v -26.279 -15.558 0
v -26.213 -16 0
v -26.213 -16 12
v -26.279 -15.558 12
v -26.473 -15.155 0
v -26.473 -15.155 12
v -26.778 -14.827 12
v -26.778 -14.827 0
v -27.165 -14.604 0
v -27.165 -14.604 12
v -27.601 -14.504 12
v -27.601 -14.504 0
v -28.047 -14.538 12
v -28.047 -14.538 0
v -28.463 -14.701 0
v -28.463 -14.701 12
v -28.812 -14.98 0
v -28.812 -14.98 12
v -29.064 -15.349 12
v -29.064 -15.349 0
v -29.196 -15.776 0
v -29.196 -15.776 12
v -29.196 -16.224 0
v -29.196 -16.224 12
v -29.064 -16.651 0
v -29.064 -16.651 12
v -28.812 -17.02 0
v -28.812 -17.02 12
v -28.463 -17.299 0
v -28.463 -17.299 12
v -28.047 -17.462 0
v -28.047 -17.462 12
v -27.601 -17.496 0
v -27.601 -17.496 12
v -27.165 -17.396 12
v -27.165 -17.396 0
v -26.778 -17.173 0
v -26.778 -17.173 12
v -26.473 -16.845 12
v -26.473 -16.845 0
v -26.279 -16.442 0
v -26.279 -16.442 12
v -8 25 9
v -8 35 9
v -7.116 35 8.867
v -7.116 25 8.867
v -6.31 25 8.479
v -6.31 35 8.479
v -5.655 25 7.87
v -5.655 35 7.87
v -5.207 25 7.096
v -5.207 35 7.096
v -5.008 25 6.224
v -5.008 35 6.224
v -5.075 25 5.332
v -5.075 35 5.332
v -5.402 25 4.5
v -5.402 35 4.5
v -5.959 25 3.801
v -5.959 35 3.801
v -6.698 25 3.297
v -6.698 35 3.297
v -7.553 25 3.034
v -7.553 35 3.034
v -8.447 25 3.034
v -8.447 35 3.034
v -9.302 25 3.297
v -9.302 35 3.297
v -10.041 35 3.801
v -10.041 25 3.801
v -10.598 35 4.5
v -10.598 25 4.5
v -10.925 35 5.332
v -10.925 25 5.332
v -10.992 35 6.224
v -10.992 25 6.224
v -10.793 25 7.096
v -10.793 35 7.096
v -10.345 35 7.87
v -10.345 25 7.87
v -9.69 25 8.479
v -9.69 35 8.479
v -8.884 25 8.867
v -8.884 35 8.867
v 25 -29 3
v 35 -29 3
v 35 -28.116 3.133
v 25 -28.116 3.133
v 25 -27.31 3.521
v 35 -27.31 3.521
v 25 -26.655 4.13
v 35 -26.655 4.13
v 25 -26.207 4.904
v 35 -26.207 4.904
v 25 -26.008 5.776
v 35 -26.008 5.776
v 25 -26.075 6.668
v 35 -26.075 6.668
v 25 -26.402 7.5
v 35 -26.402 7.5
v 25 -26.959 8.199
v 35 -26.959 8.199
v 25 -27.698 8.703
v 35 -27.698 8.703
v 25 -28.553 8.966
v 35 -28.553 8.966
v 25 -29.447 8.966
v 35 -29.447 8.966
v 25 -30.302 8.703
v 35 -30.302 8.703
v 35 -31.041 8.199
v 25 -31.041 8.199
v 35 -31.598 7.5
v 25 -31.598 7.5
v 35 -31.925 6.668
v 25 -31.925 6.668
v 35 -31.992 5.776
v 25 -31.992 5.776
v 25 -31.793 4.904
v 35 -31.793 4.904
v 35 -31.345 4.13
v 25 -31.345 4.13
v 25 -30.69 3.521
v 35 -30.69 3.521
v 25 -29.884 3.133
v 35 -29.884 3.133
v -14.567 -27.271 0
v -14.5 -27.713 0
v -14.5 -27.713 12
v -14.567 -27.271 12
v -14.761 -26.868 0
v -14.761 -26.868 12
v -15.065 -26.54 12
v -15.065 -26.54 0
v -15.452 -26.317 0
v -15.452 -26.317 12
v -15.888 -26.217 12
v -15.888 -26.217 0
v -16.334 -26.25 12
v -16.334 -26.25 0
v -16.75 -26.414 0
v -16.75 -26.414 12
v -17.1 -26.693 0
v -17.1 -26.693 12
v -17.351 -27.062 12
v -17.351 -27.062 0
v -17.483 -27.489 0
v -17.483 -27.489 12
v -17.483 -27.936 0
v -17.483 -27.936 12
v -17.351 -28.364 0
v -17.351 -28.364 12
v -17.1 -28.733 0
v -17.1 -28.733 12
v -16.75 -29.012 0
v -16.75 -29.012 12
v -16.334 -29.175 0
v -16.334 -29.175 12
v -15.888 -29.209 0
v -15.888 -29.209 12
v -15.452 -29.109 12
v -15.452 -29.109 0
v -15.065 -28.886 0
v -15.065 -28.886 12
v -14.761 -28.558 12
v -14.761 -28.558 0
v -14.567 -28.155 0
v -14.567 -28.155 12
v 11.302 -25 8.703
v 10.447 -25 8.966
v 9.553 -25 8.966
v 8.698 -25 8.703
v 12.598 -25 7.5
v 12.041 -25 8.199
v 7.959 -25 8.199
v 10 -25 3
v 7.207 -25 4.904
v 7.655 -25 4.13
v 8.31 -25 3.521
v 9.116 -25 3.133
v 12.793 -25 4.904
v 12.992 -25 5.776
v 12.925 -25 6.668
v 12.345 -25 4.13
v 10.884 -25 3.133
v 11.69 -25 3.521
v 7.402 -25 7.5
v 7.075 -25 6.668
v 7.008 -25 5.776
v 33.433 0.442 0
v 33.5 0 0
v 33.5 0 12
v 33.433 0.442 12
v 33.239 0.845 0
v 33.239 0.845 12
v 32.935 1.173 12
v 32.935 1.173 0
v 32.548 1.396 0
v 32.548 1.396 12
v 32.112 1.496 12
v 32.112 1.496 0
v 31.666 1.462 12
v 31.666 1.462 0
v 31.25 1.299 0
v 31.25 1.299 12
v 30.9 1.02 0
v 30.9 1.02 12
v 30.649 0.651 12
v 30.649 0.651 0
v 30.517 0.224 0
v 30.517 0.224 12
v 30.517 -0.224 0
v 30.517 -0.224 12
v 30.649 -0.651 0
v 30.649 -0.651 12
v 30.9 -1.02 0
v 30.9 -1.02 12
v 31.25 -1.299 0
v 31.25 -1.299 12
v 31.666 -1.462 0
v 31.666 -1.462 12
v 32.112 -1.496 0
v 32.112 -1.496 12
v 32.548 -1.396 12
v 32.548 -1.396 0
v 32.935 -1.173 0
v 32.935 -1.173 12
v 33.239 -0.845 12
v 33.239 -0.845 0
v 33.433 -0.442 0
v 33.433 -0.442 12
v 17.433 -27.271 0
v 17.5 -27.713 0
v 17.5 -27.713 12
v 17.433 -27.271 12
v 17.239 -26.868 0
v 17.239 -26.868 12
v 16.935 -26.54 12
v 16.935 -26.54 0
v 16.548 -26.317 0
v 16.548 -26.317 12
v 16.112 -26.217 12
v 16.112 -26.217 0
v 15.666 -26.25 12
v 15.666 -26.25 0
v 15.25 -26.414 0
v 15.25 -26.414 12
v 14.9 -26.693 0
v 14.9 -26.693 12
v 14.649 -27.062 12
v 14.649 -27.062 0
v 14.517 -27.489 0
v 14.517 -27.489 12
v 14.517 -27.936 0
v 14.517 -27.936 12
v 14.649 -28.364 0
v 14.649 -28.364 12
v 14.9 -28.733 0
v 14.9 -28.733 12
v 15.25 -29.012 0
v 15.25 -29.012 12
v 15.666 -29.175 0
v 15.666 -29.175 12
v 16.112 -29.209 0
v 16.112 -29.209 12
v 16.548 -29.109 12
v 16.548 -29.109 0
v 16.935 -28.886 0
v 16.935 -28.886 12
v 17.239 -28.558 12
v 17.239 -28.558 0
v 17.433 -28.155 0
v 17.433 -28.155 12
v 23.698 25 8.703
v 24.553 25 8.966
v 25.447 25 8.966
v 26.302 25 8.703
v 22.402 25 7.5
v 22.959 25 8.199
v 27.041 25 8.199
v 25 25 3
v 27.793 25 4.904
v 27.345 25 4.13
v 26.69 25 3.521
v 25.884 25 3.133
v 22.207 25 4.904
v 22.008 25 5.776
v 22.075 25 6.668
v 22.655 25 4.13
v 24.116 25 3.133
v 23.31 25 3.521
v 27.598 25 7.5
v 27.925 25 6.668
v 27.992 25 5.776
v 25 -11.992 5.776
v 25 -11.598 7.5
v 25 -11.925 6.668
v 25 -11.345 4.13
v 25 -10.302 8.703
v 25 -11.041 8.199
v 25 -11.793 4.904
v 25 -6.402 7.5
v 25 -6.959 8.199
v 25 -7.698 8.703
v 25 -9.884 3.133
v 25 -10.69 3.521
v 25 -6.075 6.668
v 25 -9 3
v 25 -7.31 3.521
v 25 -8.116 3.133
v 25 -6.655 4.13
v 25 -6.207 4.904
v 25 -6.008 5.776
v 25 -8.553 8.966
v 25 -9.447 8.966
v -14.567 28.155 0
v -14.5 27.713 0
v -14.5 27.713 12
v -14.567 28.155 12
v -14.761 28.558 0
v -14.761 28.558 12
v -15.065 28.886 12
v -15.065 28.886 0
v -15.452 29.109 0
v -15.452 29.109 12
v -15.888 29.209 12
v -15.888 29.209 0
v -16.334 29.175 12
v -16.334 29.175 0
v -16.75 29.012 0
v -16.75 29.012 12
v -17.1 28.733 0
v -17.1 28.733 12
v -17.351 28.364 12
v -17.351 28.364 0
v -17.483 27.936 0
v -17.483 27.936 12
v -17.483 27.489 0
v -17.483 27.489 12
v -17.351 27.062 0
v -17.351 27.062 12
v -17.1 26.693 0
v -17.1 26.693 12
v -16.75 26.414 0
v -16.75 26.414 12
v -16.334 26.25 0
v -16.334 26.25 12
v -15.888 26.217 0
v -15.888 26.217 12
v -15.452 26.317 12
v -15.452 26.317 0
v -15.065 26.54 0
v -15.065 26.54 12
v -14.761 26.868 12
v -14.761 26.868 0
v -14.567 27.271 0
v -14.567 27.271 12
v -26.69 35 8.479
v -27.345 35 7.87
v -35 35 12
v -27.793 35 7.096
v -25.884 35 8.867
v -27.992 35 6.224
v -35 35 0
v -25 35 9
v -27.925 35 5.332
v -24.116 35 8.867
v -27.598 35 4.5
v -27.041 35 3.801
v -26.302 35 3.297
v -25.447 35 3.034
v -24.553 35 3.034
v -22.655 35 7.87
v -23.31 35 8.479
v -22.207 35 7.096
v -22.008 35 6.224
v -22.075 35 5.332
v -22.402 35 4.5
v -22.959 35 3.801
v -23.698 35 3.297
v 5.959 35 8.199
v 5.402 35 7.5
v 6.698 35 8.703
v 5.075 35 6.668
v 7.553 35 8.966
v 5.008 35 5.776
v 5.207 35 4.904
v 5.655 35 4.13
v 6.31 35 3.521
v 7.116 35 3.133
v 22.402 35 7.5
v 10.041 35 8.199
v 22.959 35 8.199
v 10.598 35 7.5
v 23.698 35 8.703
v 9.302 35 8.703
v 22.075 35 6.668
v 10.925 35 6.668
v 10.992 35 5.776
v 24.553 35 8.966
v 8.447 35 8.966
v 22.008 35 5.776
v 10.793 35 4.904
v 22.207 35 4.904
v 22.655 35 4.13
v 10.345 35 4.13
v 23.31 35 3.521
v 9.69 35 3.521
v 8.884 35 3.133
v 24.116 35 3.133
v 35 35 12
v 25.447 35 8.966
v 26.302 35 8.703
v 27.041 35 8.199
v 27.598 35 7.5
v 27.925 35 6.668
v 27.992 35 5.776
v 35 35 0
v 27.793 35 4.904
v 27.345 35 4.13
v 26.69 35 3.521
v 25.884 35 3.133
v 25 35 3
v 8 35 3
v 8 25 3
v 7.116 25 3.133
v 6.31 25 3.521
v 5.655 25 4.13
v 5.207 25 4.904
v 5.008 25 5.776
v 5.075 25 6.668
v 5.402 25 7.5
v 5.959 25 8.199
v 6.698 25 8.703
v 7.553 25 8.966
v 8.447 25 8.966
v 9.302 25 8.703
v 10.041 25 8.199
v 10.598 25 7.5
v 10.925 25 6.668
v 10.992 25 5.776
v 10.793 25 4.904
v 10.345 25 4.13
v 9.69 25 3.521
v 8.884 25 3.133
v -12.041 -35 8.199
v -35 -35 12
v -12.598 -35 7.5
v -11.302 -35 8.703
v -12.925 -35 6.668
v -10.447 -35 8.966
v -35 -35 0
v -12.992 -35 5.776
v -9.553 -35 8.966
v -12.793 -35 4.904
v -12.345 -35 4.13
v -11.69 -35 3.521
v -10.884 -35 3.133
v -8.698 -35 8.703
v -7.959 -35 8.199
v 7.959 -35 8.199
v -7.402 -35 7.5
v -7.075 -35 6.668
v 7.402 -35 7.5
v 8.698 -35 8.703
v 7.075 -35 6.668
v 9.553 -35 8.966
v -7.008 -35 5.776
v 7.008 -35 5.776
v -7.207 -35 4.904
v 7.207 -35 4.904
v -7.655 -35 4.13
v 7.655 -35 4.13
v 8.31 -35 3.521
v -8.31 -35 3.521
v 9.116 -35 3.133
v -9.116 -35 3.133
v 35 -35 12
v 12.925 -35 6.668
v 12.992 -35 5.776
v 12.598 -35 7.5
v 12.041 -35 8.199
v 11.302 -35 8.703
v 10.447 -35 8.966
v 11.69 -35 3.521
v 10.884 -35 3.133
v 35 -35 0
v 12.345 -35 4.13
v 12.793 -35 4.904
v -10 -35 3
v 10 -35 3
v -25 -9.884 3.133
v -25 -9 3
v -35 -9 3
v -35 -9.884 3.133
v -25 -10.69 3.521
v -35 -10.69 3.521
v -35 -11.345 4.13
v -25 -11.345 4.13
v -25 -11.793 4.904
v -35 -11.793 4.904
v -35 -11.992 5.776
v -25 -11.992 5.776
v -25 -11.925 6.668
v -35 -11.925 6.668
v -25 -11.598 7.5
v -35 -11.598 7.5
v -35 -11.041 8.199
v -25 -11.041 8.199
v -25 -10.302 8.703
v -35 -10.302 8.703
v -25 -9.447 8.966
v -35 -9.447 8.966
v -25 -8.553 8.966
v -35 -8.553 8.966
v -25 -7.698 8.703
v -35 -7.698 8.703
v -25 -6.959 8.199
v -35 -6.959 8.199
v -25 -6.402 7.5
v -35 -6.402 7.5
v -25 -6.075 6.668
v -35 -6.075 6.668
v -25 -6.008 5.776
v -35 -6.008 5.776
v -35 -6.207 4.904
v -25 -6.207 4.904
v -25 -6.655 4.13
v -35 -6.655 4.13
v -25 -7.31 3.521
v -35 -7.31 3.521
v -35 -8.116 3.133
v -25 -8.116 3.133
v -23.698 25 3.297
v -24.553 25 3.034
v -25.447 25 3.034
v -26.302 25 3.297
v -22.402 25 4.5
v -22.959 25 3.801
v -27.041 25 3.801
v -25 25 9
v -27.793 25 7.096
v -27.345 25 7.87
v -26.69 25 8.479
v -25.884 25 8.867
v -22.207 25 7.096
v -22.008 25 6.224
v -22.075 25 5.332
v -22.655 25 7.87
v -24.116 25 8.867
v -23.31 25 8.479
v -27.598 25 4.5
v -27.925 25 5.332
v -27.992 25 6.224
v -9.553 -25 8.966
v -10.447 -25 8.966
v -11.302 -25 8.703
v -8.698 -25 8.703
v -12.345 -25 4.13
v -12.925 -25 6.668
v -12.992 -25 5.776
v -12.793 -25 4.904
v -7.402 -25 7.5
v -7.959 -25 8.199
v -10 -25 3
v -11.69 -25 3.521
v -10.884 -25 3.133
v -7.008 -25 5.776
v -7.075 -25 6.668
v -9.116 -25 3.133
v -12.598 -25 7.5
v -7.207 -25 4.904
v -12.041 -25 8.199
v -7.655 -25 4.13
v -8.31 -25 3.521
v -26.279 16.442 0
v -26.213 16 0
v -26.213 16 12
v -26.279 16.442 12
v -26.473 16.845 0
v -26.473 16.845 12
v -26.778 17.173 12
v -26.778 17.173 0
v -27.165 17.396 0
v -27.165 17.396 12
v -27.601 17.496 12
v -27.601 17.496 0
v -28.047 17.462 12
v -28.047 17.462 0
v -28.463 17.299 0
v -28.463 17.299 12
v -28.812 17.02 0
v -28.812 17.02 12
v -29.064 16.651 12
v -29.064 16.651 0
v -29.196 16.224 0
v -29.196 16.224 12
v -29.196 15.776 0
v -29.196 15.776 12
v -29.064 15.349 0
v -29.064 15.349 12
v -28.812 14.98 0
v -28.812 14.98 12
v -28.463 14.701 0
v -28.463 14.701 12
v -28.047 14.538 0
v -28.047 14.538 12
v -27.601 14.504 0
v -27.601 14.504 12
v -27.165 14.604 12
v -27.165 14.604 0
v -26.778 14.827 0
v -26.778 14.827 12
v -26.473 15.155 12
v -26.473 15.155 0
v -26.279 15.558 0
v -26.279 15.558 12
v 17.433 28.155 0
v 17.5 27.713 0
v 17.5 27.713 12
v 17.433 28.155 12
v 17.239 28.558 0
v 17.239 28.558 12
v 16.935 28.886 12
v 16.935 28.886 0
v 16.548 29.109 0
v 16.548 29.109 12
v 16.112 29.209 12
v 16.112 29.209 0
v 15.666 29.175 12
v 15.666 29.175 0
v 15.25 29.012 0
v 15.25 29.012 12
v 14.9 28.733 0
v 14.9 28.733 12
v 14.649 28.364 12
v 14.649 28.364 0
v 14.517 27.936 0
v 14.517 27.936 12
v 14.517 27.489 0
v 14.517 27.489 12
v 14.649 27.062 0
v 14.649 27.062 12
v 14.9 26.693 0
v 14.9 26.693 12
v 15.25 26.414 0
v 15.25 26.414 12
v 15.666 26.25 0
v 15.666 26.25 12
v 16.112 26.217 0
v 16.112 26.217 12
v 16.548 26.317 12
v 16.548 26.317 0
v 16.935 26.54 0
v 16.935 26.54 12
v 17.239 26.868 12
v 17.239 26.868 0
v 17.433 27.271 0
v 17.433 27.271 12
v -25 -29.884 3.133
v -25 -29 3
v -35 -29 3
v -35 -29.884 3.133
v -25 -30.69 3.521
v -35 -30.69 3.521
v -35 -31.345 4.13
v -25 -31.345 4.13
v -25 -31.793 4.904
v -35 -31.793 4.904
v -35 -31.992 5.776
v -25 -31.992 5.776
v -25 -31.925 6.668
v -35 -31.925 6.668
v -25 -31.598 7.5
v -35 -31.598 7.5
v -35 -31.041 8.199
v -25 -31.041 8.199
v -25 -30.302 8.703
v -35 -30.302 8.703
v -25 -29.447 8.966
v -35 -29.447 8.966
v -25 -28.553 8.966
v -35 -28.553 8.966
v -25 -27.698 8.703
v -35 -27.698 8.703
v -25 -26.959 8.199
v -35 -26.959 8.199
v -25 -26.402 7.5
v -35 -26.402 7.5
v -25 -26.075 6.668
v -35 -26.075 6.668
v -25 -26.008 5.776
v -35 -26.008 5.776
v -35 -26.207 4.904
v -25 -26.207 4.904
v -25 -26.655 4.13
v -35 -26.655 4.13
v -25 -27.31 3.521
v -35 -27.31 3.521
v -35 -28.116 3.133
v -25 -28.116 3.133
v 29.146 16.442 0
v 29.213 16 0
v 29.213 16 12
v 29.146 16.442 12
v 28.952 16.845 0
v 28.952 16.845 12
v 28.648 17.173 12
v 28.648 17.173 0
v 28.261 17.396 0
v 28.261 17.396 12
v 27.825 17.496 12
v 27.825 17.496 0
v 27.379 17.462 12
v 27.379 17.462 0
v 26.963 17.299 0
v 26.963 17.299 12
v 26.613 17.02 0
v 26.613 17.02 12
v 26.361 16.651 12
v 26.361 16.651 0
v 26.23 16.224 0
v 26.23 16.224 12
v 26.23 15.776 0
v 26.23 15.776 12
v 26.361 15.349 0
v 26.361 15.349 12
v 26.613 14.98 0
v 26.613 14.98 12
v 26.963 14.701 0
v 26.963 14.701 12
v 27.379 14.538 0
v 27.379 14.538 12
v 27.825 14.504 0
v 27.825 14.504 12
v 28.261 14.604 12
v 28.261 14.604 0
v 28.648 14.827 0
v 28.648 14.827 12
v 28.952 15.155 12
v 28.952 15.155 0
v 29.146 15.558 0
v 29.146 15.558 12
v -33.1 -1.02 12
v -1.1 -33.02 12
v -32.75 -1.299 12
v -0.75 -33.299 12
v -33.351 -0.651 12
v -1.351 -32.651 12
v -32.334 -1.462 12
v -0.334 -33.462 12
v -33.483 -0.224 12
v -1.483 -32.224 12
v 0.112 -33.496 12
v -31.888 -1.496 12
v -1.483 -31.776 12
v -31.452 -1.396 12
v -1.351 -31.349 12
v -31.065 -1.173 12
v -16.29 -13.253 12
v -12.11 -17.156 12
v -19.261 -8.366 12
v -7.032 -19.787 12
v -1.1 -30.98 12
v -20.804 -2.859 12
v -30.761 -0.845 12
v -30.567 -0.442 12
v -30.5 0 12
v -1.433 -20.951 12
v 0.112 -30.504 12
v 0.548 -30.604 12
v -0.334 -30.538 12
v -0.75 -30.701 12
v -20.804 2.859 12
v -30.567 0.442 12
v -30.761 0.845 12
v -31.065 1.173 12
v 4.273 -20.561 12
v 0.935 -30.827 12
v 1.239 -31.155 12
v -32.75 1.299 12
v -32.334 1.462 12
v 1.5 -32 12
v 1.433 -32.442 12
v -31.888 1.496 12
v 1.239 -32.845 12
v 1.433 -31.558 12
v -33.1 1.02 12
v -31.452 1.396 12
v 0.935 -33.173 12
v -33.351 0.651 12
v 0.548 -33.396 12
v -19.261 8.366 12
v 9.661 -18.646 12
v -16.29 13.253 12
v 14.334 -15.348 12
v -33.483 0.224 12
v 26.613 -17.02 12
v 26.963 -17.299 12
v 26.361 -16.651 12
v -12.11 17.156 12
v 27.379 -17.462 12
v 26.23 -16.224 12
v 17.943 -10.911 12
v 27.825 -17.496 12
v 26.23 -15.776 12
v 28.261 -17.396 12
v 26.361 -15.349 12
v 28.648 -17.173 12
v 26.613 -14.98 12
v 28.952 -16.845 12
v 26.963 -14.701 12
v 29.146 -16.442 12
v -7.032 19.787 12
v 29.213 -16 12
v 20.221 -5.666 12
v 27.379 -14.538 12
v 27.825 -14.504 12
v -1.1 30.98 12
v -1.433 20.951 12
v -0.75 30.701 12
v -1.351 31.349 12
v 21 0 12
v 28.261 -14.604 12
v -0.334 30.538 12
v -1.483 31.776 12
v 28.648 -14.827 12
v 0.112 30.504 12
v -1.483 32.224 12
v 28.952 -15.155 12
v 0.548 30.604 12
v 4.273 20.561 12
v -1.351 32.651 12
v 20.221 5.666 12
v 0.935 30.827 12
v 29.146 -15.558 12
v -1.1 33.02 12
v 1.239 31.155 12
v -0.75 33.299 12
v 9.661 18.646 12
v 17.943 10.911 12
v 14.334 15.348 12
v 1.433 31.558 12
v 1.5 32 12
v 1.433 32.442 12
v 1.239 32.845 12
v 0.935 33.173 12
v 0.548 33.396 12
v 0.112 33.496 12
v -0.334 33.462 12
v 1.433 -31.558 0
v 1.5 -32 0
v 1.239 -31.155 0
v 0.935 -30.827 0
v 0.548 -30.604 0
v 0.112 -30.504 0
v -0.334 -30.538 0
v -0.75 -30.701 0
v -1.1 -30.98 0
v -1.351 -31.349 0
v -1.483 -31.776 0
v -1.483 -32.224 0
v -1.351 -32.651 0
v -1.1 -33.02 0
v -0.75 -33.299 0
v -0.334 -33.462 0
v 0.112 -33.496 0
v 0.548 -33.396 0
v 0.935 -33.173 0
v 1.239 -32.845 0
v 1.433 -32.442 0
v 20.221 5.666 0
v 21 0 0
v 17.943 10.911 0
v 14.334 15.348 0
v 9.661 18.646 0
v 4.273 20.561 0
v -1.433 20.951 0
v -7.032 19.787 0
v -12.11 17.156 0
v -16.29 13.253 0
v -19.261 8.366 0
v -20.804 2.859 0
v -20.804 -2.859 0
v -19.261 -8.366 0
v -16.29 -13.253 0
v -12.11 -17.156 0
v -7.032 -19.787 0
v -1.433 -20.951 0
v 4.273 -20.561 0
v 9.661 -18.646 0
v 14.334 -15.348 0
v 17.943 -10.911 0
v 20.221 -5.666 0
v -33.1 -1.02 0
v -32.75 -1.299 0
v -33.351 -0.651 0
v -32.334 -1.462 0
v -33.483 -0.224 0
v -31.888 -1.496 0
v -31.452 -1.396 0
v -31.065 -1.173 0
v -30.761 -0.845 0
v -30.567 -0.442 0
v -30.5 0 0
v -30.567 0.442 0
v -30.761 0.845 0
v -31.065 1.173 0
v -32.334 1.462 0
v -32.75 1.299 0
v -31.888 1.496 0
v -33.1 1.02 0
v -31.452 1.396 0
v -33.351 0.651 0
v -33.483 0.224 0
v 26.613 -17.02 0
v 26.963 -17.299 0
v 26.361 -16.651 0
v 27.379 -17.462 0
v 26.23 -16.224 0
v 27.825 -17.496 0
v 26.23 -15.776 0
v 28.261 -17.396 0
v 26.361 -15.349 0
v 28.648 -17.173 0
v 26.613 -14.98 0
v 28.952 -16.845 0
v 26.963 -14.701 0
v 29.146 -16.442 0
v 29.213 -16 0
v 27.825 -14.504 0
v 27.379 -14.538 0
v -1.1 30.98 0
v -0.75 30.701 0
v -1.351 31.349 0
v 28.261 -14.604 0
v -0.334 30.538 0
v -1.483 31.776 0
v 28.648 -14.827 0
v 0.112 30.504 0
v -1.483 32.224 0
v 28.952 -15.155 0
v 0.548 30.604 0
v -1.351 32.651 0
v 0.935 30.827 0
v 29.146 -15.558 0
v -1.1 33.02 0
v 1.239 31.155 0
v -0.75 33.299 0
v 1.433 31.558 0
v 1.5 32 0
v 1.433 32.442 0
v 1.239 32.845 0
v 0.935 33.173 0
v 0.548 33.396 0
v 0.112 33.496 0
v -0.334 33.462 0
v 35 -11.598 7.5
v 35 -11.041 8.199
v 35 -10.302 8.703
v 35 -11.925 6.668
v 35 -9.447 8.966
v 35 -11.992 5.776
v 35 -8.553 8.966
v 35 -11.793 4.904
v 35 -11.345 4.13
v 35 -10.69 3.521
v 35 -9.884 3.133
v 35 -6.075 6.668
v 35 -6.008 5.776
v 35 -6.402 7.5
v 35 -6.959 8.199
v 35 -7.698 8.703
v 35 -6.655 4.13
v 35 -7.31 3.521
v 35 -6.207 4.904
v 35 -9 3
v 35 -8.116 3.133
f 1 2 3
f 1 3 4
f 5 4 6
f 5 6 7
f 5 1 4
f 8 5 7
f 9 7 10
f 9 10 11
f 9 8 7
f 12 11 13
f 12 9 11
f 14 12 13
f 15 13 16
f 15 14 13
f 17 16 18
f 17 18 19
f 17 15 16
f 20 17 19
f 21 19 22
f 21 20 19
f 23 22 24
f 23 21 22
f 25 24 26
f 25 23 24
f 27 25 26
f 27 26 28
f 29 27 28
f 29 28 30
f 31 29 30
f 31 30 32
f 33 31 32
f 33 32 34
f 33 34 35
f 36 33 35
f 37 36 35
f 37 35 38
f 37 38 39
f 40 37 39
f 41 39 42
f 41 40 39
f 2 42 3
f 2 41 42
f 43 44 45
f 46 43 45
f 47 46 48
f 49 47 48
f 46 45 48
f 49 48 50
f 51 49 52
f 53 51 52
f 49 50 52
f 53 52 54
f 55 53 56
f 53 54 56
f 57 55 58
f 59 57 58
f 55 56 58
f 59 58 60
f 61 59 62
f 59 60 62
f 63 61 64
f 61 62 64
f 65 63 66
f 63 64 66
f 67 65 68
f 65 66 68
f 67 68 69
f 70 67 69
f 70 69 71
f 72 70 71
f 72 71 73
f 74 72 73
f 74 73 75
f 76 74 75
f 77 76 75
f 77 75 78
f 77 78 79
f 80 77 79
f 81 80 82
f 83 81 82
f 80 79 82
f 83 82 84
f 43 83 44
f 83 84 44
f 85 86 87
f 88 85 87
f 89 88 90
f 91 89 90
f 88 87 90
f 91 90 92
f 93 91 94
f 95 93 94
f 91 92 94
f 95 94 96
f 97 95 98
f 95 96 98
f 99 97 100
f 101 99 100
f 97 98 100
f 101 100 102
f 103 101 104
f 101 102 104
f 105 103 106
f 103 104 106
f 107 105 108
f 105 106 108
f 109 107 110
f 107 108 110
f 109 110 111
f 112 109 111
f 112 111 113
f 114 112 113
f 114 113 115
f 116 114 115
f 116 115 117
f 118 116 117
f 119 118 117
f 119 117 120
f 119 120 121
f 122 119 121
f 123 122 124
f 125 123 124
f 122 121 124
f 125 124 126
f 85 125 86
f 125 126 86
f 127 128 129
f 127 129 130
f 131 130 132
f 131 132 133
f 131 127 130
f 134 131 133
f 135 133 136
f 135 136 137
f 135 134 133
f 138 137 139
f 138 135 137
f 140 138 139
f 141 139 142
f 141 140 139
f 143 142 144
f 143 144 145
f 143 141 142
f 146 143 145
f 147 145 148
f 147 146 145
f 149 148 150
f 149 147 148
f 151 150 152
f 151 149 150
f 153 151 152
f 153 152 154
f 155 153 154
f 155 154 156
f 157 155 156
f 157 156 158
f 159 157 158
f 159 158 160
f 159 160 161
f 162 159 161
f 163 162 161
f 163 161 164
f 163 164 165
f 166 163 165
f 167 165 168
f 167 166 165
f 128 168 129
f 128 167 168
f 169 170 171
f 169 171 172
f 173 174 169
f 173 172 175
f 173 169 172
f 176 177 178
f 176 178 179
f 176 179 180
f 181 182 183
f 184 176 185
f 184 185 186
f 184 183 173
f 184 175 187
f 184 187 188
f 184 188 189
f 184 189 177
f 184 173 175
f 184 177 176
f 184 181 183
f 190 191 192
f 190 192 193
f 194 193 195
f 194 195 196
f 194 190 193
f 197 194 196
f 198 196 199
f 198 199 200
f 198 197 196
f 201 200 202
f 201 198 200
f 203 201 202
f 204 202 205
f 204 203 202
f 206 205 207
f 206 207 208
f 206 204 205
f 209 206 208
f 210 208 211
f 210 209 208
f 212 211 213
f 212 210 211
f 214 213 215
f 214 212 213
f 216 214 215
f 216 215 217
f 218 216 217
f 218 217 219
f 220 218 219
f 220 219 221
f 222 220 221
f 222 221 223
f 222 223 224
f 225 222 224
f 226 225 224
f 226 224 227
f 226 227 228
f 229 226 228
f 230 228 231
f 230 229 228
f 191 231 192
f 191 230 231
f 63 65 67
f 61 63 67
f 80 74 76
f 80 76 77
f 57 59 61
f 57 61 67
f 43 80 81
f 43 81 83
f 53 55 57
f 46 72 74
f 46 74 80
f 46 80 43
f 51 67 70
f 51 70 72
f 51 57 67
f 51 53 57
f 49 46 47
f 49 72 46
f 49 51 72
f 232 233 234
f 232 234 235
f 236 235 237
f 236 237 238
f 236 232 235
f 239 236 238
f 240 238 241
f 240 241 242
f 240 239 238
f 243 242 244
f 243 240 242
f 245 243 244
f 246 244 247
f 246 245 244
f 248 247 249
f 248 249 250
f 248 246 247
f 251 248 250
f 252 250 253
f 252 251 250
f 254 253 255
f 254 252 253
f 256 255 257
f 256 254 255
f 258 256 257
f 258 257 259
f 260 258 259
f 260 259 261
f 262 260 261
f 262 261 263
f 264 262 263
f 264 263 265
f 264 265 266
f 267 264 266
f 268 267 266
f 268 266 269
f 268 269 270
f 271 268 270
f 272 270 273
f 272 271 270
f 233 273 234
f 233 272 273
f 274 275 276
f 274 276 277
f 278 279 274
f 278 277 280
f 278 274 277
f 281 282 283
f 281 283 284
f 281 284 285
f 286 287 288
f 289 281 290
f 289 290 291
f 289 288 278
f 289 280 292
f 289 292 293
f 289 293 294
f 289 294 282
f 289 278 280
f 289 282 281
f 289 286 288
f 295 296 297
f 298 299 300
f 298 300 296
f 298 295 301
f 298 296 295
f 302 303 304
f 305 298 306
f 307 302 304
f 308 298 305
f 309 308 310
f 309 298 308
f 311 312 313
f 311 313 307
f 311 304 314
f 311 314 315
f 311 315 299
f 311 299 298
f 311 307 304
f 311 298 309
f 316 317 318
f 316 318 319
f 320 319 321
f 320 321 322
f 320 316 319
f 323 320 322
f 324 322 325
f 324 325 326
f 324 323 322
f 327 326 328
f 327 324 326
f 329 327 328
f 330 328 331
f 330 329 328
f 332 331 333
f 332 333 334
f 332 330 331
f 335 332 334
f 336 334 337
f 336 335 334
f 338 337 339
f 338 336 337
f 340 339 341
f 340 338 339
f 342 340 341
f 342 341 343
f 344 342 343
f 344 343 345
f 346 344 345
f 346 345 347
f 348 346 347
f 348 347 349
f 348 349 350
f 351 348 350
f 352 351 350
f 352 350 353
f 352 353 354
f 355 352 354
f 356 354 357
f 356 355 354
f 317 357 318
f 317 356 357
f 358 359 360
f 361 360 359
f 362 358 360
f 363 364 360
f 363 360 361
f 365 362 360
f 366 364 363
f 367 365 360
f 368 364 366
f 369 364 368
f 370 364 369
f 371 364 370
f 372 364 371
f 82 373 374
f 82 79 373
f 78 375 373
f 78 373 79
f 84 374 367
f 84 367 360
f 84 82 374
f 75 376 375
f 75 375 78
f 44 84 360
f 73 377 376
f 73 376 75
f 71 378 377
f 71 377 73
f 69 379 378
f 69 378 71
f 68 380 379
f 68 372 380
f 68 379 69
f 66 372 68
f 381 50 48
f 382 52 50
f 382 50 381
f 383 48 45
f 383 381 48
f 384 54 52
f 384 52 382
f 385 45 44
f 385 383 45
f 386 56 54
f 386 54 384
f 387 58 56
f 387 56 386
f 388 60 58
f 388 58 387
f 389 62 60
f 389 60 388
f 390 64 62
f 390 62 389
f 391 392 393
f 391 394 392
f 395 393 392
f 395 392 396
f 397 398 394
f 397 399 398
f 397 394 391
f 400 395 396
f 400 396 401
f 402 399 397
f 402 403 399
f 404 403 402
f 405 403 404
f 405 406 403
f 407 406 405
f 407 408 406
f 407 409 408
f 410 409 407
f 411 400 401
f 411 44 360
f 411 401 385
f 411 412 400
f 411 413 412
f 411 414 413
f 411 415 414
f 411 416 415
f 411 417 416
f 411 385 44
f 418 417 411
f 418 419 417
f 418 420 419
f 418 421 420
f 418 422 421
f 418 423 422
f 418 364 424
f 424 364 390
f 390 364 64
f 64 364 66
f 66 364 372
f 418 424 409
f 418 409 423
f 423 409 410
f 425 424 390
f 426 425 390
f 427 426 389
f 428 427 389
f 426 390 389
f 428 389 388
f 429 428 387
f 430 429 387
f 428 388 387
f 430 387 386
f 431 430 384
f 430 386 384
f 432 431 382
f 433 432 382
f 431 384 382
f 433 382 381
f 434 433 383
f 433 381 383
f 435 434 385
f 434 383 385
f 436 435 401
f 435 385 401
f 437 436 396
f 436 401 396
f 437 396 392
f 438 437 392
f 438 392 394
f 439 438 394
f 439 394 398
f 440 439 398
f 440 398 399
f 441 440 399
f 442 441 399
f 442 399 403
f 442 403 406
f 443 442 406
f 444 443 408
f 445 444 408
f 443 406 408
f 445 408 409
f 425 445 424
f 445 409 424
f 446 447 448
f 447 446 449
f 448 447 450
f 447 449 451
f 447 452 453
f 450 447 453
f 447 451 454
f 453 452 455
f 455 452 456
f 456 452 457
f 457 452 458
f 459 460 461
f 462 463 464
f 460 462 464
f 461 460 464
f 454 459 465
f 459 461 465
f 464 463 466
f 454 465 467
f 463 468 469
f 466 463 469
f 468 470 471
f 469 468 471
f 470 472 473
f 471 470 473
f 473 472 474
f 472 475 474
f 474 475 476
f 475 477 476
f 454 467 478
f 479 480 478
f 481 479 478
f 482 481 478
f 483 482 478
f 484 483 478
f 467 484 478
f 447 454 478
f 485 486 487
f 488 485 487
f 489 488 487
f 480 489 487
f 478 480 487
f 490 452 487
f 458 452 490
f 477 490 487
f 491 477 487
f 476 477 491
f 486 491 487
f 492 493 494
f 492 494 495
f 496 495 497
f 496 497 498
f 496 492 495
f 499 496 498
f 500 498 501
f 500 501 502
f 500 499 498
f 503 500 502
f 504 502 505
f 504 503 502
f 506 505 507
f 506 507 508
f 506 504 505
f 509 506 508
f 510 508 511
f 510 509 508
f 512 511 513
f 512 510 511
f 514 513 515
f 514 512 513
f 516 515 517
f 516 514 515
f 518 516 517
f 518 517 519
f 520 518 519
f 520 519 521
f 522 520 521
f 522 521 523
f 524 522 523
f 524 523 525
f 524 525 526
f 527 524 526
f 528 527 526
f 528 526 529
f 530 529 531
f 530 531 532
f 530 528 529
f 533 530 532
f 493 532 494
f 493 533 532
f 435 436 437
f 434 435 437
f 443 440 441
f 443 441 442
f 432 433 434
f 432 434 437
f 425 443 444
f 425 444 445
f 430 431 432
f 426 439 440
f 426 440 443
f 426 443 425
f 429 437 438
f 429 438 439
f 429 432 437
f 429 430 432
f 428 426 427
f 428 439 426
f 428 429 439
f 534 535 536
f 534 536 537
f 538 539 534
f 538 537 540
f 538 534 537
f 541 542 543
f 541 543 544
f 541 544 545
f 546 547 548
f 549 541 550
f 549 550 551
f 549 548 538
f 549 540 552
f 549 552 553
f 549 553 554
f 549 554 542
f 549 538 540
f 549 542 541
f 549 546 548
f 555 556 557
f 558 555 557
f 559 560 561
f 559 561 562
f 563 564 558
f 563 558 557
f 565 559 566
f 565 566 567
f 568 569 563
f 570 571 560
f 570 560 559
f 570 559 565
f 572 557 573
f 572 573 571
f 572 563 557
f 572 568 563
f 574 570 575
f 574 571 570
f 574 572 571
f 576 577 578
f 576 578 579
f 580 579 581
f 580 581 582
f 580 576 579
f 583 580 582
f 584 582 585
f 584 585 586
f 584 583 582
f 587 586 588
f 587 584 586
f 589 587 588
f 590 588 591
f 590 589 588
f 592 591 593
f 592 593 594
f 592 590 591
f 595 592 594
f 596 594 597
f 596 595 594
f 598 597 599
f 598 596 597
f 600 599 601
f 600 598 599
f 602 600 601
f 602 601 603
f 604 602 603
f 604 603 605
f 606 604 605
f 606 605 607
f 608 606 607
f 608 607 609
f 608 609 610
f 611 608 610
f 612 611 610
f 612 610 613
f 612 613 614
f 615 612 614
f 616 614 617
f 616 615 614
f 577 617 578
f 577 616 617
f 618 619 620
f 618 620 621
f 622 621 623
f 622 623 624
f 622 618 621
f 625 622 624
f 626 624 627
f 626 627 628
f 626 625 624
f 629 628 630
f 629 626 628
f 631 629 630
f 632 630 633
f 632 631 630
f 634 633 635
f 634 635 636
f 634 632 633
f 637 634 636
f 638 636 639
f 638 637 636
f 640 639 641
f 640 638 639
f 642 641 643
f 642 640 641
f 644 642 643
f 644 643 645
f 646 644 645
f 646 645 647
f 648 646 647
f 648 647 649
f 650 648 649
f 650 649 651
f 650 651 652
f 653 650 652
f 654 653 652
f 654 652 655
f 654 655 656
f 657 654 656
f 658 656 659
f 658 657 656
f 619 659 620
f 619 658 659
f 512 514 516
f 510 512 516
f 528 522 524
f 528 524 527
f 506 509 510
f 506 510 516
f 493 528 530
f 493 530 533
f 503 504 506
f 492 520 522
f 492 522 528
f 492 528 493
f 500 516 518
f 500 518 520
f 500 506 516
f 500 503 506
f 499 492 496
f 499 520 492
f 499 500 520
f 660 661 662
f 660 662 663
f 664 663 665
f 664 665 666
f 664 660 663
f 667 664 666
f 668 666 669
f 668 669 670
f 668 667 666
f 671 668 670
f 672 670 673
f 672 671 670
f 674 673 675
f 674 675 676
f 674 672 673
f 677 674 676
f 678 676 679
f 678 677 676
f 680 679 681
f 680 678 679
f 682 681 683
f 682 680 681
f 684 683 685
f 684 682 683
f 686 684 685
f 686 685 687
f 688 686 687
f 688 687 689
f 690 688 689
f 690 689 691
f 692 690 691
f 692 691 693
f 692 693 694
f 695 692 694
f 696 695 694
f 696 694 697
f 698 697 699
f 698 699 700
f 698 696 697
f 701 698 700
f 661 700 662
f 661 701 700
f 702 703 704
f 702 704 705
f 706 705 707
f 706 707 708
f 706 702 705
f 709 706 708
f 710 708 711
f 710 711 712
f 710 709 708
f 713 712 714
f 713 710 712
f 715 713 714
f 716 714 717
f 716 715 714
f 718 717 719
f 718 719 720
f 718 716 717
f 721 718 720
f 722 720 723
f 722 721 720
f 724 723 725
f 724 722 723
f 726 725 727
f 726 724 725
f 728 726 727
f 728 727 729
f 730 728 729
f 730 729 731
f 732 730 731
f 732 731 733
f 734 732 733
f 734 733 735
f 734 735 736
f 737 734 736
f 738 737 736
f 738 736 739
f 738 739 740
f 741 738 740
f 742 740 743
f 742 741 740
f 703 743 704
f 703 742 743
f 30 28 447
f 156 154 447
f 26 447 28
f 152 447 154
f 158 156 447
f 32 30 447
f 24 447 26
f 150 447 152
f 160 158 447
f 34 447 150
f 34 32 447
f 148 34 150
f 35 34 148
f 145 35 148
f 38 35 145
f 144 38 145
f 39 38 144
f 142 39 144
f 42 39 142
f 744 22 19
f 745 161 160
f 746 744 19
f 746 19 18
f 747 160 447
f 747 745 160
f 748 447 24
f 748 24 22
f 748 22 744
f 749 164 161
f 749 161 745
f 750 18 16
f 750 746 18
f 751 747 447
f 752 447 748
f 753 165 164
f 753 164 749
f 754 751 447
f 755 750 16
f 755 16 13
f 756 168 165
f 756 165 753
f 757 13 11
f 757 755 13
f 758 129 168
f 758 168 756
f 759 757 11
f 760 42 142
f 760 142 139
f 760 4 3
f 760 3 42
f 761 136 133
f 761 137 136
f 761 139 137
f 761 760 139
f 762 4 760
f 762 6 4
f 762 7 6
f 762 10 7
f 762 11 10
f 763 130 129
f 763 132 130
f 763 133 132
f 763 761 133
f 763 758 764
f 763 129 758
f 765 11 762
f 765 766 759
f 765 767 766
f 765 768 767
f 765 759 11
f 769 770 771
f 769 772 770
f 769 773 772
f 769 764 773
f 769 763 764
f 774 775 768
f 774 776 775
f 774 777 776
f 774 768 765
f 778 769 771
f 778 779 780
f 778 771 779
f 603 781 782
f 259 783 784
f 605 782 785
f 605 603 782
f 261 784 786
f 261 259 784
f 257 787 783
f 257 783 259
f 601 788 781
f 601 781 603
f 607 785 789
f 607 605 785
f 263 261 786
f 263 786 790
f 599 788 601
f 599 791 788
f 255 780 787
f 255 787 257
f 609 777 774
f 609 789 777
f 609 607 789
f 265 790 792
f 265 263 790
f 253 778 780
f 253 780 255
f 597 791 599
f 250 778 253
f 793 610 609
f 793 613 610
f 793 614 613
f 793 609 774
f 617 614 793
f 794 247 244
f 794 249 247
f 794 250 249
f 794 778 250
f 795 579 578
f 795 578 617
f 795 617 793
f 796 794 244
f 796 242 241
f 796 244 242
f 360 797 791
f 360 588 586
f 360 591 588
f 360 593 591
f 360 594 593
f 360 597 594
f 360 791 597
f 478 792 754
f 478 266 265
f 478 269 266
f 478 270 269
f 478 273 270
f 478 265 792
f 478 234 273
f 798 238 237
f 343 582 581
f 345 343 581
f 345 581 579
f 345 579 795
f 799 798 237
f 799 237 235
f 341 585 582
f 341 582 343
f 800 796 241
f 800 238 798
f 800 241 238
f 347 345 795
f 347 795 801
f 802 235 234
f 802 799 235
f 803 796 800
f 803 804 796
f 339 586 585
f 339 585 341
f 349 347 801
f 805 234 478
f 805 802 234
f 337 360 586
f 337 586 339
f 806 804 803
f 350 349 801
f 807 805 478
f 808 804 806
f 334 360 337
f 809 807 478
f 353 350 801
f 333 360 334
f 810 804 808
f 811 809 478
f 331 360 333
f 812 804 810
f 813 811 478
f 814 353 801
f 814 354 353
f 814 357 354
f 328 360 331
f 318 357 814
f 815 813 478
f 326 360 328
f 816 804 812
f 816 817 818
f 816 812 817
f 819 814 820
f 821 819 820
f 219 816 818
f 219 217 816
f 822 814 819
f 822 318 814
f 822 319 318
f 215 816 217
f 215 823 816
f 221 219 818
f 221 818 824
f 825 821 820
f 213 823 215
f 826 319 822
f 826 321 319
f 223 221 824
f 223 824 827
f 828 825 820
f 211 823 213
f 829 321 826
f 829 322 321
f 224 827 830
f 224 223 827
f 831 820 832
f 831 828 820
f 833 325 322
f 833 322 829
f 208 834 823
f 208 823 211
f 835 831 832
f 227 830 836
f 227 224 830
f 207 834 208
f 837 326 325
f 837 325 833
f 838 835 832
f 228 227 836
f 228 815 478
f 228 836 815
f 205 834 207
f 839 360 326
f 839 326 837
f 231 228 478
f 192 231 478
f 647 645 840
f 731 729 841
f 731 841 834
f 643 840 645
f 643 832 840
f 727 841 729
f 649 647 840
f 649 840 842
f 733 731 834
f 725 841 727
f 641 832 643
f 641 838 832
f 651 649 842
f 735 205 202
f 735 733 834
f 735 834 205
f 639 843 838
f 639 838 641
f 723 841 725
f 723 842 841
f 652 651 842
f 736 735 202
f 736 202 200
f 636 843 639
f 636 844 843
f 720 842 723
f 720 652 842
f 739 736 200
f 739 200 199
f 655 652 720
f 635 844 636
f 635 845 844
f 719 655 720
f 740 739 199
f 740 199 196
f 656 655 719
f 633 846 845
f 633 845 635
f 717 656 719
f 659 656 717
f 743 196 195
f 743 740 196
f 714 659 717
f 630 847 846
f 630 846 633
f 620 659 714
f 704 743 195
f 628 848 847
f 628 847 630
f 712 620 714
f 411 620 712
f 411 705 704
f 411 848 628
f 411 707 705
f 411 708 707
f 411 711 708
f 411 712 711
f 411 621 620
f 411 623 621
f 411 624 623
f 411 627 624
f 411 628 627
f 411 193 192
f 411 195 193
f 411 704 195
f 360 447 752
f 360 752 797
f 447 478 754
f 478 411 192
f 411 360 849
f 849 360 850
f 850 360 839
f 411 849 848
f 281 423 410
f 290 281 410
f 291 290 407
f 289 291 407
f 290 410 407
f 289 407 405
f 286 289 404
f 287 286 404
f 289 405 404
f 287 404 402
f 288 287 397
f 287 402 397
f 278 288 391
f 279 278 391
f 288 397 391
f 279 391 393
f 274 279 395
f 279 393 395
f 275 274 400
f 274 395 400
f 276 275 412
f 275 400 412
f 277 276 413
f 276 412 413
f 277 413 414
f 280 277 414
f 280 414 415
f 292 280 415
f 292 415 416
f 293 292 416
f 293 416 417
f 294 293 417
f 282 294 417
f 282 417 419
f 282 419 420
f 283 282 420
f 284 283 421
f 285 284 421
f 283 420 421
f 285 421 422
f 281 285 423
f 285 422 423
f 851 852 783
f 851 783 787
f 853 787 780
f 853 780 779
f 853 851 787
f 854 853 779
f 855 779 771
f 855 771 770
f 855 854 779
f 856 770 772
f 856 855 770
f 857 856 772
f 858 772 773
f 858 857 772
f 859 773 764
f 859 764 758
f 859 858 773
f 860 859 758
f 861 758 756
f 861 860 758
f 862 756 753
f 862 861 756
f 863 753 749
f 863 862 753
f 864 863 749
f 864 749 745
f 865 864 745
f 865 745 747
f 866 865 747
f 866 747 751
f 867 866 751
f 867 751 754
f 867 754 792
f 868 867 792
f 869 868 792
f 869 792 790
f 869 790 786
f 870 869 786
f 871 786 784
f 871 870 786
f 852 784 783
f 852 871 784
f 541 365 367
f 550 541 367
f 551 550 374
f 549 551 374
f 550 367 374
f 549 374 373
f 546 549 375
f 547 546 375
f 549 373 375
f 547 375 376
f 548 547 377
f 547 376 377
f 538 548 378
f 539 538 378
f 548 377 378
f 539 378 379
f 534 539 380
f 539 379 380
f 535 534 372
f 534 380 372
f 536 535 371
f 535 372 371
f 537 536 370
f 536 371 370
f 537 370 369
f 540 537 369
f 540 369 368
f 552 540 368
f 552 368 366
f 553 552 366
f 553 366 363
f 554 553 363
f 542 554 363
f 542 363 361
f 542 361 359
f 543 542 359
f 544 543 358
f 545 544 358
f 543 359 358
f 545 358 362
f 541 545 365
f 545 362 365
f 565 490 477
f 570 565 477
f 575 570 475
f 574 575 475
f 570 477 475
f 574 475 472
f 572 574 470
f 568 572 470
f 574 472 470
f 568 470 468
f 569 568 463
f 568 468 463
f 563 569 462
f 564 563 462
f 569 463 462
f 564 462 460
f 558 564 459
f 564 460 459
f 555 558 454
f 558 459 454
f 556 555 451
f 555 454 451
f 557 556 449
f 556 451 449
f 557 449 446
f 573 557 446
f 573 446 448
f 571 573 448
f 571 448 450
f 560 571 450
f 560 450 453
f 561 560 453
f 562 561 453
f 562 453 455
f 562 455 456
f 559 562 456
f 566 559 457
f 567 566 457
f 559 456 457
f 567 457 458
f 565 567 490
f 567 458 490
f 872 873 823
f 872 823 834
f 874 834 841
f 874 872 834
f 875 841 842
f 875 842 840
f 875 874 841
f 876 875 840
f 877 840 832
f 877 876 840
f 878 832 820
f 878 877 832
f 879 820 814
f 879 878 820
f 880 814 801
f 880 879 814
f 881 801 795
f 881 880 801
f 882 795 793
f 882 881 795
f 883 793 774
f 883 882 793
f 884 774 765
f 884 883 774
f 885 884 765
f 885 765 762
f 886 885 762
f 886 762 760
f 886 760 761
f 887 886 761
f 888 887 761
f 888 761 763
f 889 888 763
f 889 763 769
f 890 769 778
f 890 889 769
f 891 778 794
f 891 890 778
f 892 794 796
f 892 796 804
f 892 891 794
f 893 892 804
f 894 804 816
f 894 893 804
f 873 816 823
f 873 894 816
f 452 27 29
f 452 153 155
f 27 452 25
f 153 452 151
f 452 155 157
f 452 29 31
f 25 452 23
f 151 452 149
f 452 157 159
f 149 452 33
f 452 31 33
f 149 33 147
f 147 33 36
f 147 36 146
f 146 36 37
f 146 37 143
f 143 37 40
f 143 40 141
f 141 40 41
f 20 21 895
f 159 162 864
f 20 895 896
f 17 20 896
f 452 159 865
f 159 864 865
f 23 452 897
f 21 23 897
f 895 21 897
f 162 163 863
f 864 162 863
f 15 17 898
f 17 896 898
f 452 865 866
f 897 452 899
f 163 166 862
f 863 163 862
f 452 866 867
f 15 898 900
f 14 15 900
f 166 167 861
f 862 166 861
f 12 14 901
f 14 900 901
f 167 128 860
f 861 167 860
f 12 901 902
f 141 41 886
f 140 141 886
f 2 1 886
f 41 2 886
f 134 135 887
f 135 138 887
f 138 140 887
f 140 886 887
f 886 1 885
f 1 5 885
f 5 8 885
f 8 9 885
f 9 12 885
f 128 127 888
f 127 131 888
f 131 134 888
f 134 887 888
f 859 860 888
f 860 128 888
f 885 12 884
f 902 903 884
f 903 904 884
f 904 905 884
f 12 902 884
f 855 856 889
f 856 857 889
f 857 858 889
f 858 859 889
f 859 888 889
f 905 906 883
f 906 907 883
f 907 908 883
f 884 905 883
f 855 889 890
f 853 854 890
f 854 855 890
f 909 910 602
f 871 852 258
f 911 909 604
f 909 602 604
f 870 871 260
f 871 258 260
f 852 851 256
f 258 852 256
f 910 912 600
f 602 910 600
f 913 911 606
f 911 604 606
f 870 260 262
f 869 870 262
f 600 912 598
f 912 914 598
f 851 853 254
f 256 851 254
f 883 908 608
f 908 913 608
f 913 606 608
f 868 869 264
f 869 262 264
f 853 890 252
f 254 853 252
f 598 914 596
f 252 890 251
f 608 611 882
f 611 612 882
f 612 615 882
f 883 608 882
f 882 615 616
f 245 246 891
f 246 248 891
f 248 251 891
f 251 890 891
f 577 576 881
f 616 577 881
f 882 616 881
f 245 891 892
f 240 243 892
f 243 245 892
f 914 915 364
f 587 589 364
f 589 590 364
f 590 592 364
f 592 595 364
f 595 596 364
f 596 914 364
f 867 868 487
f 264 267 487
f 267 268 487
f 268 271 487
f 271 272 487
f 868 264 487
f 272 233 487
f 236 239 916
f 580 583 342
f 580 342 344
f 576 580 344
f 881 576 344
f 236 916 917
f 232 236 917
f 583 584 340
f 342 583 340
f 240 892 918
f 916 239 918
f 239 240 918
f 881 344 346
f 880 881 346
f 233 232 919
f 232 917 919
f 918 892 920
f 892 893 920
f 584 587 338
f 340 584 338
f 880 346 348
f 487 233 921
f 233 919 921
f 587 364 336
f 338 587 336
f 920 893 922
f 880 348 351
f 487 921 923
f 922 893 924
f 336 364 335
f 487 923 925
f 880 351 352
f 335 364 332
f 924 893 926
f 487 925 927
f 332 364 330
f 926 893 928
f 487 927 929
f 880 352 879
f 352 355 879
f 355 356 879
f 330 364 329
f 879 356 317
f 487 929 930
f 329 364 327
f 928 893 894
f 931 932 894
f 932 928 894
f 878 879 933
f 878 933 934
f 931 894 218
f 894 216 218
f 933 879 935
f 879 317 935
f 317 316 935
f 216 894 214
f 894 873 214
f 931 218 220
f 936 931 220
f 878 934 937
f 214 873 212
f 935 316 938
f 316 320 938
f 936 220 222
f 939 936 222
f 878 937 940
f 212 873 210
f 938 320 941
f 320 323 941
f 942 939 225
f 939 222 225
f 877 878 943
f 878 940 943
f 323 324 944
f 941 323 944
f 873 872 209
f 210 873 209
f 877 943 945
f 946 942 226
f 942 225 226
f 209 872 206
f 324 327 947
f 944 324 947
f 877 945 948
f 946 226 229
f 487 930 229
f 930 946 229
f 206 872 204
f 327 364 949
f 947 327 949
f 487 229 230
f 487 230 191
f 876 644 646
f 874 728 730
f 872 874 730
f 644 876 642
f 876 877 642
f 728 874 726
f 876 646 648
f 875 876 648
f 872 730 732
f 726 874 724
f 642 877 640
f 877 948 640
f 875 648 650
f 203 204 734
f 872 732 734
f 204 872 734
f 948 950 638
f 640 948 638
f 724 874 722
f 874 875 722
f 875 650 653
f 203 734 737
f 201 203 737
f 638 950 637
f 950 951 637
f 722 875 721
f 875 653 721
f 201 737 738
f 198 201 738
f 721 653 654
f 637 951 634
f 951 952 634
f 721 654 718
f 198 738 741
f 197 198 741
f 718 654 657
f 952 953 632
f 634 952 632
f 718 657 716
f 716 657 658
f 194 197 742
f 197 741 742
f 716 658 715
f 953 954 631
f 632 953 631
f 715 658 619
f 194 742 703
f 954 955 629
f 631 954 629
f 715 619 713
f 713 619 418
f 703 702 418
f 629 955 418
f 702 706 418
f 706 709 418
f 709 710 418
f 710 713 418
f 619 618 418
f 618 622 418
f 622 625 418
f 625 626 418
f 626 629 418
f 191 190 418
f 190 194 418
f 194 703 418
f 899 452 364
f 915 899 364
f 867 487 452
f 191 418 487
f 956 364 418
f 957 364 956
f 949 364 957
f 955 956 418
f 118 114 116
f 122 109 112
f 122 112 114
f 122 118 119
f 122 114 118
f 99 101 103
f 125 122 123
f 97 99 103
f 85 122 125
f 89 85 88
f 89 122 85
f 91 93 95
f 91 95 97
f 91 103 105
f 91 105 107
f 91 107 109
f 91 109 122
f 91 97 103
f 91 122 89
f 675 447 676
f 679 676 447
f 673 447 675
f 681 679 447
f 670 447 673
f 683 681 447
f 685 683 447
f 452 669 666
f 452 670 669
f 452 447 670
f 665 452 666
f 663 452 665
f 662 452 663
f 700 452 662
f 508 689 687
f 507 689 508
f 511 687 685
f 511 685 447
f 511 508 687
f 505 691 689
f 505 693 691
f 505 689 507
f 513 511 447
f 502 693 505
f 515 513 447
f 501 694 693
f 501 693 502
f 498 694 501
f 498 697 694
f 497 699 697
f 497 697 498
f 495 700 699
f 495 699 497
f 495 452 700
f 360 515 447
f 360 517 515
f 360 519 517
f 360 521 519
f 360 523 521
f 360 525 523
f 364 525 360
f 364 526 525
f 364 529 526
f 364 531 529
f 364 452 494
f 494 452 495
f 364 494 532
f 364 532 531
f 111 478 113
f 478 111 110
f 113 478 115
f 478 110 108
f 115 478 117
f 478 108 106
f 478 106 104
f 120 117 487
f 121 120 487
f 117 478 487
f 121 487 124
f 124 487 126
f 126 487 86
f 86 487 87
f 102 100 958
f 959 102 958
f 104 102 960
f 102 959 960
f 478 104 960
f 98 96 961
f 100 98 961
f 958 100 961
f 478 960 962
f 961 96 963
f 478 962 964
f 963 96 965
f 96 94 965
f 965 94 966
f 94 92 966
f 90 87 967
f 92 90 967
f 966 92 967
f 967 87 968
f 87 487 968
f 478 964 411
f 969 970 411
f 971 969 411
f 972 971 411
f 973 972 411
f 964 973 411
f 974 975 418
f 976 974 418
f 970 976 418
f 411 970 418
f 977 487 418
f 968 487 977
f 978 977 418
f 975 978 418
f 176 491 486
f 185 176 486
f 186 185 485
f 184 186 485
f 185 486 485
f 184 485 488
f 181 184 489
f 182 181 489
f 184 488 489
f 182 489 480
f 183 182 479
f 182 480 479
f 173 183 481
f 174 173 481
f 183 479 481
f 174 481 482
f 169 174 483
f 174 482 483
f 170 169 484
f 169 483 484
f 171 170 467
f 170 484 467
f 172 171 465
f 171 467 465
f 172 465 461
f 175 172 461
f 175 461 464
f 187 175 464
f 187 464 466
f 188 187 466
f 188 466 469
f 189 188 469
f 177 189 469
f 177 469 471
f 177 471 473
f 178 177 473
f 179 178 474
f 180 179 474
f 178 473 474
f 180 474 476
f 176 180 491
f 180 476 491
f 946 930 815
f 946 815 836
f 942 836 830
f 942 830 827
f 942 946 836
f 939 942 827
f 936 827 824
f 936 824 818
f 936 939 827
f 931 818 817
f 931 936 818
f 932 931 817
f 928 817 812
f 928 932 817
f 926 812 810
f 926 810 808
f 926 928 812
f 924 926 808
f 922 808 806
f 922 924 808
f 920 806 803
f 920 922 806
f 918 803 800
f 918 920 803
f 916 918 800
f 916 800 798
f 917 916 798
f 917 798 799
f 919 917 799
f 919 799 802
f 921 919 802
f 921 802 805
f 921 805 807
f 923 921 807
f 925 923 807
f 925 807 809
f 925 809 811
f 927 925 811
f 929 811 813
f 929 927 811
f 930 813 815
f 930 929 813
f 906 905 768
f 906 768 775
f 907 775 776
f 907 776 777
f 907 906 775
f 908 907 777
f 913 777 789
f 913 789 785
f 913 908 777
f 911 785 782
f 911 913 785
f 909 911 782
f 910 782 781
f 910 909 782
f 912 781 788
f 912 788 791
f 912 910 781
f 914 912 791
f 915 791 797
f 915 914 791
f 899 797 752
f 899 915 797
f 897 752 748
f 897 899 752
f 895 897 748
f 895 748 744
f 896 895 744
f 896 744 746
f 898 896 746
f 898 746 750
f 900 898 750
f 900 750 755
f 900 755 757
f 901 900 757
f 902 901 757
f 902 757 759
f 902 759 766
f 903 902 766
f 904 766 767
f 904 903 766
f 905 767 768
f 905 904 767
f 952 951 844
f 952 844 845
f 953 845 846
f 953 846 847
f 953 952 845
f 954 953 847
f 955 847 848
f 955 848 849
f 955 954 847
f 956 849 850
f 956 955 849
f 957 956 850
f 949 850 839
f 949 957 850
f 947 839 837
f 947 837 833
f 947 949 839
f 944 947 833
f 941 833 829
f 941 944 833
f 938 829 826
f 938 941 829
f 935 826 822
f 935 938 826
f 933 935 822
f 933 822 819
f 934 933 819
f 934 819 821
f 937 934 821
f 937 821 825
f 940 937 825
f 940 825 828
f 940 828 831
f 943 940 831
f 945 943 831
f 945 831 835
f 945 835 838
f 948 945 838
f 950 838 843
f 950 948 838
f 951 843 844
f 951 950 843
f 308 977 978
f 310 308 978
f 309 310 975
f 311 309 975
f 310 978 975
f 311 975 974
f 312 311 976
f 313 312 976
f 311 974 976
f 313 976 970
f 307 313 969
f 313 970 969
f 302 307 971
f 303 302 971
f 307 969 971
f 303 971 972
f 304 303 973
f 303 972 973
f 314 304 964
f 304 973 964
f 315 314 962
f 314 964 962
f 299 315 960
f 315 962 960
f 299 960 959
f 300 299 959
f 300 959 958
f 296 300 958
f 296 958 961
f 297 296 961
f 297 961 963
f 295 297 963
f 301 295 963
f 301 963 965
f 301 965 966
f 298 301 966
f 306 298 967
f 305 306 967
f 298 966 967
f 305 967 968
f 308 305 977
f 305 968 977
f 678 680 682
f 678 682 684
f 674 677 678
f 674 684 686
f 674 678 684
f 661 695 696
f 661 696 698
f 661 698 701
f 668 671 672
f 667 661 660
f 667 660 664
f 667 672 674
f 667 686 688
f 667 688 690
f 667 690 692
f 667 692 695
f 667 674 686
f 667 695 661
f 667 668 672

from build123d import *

# Parameters (mm, degrees)
SKETCH_1_W          = 70
SKETCH_1_H          = 70
SKETCH_1_R          = 1.5
SKETCH_1_R_2        = 21
EXTRUDE_1_DEPTH     = 12
SKETCH_3_R          = 3
CUT_EXTRUDE_2_DEPTH = 10
SKETCH_4_R          = 3
CUT_EXTRUDE_3_DEPTH = 10
CUT_EXTRUDE_START   = -10
SKETCH_5_R          = 3
CUT_EXTRUDE_4_DEPTH = 10
SKETCH_6_R          = 3
CUT_EXTRUDE_5_DEPTH = 10


with BuildPart() as part:
    # 草图1 → 凸台-拉伸1 (new body)
    with BuildSketch(Plane.XY):
        Rectangle(SKETCH_1_W, SKETCH_1_H)
        with Locations((32, 0)):
            Circle(SKETCH_1_R, mode=Mode.SUBTRACT)
        with Locations((27.712812921, -16)):
            Circle(SKETCH_1_R, mode=Mode.SUBTRACT)
        with Locations((16, -27.712812921)):
            Circle(SKETCH_1_R, mode=Mode.SUBTRACT)
        with Locations((0, -32)):
            Circle(SKETCH_1_R, mode=Mode.SUBTRACT)
        with Locations((-16, -27.712812921)):
            Circle(SKETCH_1_R, mode=Mode.SUBTRACT)
        with Locations((-27.712812921, -16)):
            Circle(SKETCH_1_R, mode=Mode.SUBTRACT)
        with Locations((-32, 0)):
            Circle(SKETCH_1_R, mode=Mode.SUBTRACT)
        with Locations((-27.712812921, 16)):
            Circle(SKETCH_1_R, mode=Mode.SUBTRACT)
        with Locations((-16, 27.712812921)):
            Circle(SKETCH_1_R, mode=Mode.SUBTRACT)
        with Locations((0, 32)):
            Circle(SKETCH_1_R, mode=Mode.SUBTRACT)
        with Locations((16, 27.712812921)):
            Circle(SKETCH_1_R, mode=Mode.SUBTRACT)
        with Locations((27.712812921, 16)):
            Circle(SKETCH_1_R, mode=Mode.SUBTRACT)
        Circle(SKETCH_1_R_2, mode=Mode.SUBTRACT)
    extrude(amount=EXTRUDE_1_DEPTH)

    # 草图3 → 切除-拉伸2 (cut)
    with BuildSketch(Plane(origin=(0, 35, 0), x_dir=(1, 0, 0), z_dir=(0, 1, 0))):
        with Locations(Location((-25, -6, 0), (0, 0, 270))):
            Circle(SKETCH_3_R)
        with Locations(Location((-8, -6, 0), (0, 0, 270))):
            Circle(SKETCH_3_R)
        with Locations(Location((25, -6, 0), (0, 0, 90))):
            Circle(SKETCH_3_R)
        with Locations(Location((8, -6, 0), (0, 0, 90))):
            Circle(SKETCH_3_R)
    extrude(amount=-CUT_EXTRUDE_2_DEPTH, mode=Mode.SUBTRACT)

    # 草图4 → 切除-拉伸3 (cut)
    with BuildSketch(Plane(origin=(35, 0, 0), x_dir=(0, 0, -1), z_dir=(1, 0, 0))):
        with Locations((-6, -9)):
            Circle(SKETCH_4_R)
        with Locations((-6, -29)):
            Circle(SKETCH_4_R)
    extrude(amount=-CUT_EXTRUDE_3_DEPTH, mode=Mode.SUBTRACT)

    # 草图5 → 切除-拉伸4 (cut)
    with BuildSketch(Plane.ZY.offset(35).offset(CUT_EXTRUDE_START)):
        with Locations(Location((6, -29, 0), (0, 0, 180))):
            Circle(SKETCH_5_R)
        with Locations(Location((6, -9, 0), (0, 0, 180))):
            Circle(SKETCH_5_R)
    extrude(amount=CUT_EXTRUDE_4_DEPTH, mode=Mode.SUBTRACT)

    # 草图6 → 切除-拉伸5 (cut)
    with BuildSketch(Plane.XZ.offset(35)):
        with Locations(Location((10, 6, 0), (0, 0, 270))):
            Circle(SKETCH_6_R)
        with Locations(Location((-10, 6, 0), (0, 0, 270))):
            Circle(SKETCH_6_R)
    extrude(amount=-CUT_EXTRUDE_5_DEPTH, mode=Mode.SUBTRACT)


solid = part.part
